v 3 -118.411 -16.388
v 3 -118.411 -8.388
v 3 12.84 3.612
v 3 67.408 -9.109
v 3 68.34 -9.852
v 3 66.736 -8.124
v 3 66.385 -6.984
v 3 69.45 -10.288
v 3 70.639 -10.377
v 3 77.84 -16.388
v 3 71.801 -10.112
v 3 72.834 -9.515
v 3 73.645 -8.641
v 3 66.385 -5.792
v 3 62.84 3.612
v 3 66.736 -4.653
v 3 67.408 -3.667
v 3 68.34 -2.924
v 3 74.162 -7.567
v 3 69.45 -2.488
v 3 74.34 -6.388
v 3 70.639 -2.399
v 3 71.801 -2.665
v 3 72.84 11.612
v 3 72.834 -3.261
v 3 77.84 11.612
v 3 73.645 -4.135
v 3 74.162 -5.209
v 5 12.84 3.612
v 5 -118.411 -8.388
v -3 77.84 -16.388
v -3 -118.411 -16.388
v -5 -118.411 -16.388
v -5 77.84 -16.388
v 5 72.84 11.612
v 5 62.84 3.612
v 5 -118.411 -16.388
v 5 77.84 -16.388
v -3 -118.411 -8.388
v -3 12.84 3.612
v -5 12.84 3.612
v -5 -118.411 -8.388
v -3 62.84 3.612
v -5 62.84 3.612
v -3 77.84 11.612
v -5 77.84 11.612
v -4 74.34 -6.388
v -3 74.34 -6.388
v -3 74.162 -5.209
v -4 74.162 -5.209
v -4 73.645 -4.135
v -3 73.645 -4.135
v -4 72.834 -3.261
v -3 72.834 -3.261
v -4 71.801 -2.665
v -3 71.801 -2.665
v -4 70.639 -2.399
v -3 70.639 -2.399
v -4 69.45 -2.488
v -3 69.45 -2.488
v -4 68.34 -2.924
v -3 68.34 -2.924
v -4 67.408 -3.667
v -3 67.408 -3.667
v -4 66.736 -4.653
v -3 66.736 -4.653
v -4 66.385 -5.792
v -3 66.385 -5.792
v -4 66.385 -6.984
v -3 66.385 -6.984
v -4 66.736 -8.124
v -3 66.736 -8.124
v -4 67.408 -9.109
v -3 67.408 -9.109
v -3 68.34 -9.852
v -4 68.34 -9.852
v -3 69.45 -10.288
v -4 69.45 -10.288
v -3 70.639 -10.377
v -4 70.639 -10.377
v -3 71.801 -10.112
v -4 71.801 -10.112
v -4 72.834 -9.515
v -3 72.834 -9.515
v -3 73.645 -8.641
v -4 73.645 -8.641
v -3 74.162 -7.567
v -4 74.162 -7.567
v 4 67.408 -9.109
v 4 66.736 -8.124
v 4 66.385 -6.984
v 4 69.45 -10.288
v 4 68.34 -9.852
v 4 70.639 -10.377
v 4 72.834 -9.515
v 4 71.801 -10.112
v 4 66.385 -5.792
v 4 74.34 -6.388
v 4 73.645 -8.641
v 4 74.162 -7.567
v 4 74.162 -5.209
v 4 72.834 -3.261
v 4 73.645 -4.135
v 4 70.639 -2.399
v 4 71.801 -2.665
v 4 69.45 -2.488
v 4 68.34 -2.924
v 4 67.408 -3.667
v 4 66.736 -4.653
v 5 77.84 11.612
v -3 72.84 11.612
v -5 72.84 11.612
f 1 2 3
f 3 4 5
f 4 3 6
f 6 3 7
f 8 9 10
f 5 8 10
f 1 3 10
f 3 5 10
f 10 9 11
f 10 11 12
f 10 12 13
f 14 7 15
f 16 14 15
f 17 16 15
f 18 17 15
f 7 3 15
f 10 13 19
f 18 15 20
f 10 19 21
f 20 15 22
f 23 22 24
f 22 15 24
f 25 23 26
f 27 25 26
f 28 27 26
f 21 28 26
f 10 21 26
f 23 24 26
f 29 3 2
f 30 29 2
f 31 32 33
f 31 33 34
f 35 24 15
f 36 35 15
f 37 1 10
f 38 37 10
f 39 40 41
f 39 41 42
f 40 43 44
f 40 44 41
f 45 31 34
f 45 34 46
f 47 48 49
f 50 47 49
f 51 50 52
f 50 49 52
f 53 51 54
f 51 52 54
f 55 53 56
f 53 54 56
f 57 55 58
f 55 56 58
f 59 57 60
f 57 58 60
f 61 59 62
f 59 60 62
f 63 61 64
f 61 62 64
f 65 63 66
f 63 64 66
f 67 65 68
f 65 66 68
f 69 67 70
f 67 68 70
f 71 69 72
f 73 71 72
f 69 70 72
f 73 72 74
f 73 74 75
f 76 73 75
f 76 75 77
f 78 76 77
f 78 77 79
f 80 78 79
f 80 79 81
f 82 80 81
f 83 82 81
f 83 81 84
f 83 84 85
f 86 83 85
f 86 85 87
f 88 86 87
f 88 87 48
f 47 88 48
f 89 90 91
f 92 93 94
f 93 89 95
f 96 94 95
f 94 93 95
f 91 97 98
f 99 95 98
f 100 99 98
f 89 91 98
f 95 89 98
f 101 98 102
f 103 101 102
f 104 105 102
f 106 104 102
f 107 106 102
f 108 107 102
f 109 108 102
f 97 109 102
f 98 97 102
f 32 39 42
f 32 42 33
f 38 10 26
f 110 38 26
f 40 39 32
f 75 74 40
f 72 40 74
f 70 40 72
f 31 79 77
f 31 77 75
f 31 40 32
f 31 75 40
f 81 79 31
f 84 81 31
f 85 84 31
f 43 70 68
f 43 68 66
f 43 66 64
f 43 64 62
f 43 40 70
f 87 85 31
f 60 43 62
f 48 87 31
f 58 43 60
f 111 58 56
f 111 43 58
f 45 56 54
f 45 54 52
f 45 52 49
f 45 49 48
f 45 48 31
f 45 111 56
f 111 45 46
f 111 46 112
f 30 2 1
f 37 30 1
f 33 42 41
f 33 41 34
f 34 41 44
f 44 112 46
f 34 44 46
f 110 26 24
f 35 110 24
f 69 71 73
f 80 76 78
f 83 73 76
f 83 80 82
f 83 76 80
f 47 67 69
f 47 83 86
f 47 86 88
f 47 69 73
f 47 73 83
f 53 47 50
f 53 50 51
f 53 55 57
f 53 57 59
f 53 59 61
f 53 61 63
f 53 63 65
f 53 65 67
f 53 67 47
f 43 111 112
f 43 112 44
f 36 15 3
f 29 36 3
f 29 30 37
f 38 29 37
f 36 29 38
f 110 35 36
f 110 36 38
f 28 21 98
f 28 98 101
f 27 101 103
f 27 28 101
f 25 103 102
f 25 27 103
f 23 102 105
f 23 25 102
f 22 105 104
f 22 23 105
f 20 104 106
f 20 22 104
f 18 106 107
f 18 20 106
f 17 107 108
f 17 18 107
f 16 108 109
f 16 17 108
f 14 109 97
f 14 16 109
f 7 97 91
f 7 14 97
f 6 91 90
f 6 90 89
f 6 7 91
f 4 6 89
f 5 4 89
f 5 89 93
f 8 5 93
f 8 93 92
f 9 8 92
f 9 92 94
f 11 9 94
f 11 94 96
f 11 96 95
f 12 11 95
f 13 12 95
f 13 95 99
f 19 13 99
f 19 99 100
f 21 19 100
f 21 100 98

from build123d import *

# Parameters (mm, degrees)
F1_START = 3
F1_DEPTH = 2
F2_DEPTH = 4


with BuildPart() as f1:
    # F0 (on Right) → F1 (new body)
    with BuildSketch(Plane.YZ.offset(F1_START)):
        Polygon((-118.4109357178, -8.3881713183), (-118.4109357178, -16.3881713183), (77.8400642822, -16.3881713183), (77.8400642822, -6.3881713183), (77.8400642822, 3.6118286817), (62.8400642822, 3.6118286817), (12.8400642822, 3.6118286817), align=None)
        Polygon((-114.4109357178, -14.3881713183), (-114.4109357178, -10.0308014794), (12.9313018888, 1.6118286817), (12.9313018888, -14.3881713183), align=None, mode=Mode.SUBTRACT)
        Polygon((62.8400642822, 1.6118286817), (62.8400642822, -6.3881713183), (62.8400642822, -14.3881713183), (16.9313018888, -14.3881713183), (16.9313018888, 1.6118286817), align=None, mode=Mode.SUBTRACT)
        with BuildLine():
            ThreePointArc((66.3400642822, -6.3881713183), (70.3400642822, -2.3881713183), (74.3400642822, -6.3881713183))
            ThreePointArc((74.3400642822, -6.3881713183), (70.3400642822, -10.3881713183), (66.3400642822, -6.3881713183))
        make_face(mode=Mode.SUBTRACT)
        Polygon((12.9313018888, 1.6118286817), (-114.4109357178, -10.0308014794), (-114.4109357178, -14.3881713183), (12.9313018888, -14.3881713183), align=None)
        Polygon((62.8400642822, -14.3881713183), (62.8400642822, -6.3881713183), (62.8400642822, 1.6118286817), (16.9313018888, 1.6118286817), (16.9313018888, -14.3881713183), align=None)
        with BuildLine():
            Line((66.3400642822, -6.3881713183), (74.3400642822, -6.3881713183))
            ThreePointArc((74.3400642822, -6.3881713183), (70.3400642822, -2.3881713183), (66.3400642822, -6.3881713183))
        make_face()
        with BuildLine():
            ThreePointArc((66.3400642822, -6.3881713183), (70.3400642822, -10.3881713183), (74.3400642822, -6.3881713183))
            Line((74.3400642822, -6.3881713183), (66.3400642822, -6.3881713183))
        make_face()
        Polygon((72.8400642822, 11.6118286817), (62.8400642822, 3.6118286817), (77.8400642822, 3.6118286817), (77.8400642822, 11.6118286817), align=None)
    extrude(amount=F1_DEPTH)

    # F0 (on Right) → F2 (cut)
    with BuildSketch(Plane.YZ):
        with BuildLine():
            ThreePointArc((66.3400642822, -6.3881713183), (70.3400642822, -10.3881713183), (74.3400642822, -6.3881713183))
            Line((74.3400642822, -6.3881713183), (66.3400642822, -6.3881713183))
        make_face()
        with BuildLine():
            Line((66.3400642822, -6.3881713183), (74.3400642822, -6.3881713183))
            ThreePointArc((74.3400642822, -6.3881713183), (70.3400642822, -2.3881713183), (66.3400642822, -6.3881713183))
        make_face()
    extrude(amount=F2_DEPTH, mode=Mode.SUBTRACT)


with BuildPart() as f3_1:
    # F3: copy of F1
    add(f1.part.moved(Location((-100, 0, 0))))


with BuildPart() as f5_1:
    # F5: instance of F1
    add(f1.part.mirror(Plane.YZ))


solid = Compound([f1.part, f5_1.part])
